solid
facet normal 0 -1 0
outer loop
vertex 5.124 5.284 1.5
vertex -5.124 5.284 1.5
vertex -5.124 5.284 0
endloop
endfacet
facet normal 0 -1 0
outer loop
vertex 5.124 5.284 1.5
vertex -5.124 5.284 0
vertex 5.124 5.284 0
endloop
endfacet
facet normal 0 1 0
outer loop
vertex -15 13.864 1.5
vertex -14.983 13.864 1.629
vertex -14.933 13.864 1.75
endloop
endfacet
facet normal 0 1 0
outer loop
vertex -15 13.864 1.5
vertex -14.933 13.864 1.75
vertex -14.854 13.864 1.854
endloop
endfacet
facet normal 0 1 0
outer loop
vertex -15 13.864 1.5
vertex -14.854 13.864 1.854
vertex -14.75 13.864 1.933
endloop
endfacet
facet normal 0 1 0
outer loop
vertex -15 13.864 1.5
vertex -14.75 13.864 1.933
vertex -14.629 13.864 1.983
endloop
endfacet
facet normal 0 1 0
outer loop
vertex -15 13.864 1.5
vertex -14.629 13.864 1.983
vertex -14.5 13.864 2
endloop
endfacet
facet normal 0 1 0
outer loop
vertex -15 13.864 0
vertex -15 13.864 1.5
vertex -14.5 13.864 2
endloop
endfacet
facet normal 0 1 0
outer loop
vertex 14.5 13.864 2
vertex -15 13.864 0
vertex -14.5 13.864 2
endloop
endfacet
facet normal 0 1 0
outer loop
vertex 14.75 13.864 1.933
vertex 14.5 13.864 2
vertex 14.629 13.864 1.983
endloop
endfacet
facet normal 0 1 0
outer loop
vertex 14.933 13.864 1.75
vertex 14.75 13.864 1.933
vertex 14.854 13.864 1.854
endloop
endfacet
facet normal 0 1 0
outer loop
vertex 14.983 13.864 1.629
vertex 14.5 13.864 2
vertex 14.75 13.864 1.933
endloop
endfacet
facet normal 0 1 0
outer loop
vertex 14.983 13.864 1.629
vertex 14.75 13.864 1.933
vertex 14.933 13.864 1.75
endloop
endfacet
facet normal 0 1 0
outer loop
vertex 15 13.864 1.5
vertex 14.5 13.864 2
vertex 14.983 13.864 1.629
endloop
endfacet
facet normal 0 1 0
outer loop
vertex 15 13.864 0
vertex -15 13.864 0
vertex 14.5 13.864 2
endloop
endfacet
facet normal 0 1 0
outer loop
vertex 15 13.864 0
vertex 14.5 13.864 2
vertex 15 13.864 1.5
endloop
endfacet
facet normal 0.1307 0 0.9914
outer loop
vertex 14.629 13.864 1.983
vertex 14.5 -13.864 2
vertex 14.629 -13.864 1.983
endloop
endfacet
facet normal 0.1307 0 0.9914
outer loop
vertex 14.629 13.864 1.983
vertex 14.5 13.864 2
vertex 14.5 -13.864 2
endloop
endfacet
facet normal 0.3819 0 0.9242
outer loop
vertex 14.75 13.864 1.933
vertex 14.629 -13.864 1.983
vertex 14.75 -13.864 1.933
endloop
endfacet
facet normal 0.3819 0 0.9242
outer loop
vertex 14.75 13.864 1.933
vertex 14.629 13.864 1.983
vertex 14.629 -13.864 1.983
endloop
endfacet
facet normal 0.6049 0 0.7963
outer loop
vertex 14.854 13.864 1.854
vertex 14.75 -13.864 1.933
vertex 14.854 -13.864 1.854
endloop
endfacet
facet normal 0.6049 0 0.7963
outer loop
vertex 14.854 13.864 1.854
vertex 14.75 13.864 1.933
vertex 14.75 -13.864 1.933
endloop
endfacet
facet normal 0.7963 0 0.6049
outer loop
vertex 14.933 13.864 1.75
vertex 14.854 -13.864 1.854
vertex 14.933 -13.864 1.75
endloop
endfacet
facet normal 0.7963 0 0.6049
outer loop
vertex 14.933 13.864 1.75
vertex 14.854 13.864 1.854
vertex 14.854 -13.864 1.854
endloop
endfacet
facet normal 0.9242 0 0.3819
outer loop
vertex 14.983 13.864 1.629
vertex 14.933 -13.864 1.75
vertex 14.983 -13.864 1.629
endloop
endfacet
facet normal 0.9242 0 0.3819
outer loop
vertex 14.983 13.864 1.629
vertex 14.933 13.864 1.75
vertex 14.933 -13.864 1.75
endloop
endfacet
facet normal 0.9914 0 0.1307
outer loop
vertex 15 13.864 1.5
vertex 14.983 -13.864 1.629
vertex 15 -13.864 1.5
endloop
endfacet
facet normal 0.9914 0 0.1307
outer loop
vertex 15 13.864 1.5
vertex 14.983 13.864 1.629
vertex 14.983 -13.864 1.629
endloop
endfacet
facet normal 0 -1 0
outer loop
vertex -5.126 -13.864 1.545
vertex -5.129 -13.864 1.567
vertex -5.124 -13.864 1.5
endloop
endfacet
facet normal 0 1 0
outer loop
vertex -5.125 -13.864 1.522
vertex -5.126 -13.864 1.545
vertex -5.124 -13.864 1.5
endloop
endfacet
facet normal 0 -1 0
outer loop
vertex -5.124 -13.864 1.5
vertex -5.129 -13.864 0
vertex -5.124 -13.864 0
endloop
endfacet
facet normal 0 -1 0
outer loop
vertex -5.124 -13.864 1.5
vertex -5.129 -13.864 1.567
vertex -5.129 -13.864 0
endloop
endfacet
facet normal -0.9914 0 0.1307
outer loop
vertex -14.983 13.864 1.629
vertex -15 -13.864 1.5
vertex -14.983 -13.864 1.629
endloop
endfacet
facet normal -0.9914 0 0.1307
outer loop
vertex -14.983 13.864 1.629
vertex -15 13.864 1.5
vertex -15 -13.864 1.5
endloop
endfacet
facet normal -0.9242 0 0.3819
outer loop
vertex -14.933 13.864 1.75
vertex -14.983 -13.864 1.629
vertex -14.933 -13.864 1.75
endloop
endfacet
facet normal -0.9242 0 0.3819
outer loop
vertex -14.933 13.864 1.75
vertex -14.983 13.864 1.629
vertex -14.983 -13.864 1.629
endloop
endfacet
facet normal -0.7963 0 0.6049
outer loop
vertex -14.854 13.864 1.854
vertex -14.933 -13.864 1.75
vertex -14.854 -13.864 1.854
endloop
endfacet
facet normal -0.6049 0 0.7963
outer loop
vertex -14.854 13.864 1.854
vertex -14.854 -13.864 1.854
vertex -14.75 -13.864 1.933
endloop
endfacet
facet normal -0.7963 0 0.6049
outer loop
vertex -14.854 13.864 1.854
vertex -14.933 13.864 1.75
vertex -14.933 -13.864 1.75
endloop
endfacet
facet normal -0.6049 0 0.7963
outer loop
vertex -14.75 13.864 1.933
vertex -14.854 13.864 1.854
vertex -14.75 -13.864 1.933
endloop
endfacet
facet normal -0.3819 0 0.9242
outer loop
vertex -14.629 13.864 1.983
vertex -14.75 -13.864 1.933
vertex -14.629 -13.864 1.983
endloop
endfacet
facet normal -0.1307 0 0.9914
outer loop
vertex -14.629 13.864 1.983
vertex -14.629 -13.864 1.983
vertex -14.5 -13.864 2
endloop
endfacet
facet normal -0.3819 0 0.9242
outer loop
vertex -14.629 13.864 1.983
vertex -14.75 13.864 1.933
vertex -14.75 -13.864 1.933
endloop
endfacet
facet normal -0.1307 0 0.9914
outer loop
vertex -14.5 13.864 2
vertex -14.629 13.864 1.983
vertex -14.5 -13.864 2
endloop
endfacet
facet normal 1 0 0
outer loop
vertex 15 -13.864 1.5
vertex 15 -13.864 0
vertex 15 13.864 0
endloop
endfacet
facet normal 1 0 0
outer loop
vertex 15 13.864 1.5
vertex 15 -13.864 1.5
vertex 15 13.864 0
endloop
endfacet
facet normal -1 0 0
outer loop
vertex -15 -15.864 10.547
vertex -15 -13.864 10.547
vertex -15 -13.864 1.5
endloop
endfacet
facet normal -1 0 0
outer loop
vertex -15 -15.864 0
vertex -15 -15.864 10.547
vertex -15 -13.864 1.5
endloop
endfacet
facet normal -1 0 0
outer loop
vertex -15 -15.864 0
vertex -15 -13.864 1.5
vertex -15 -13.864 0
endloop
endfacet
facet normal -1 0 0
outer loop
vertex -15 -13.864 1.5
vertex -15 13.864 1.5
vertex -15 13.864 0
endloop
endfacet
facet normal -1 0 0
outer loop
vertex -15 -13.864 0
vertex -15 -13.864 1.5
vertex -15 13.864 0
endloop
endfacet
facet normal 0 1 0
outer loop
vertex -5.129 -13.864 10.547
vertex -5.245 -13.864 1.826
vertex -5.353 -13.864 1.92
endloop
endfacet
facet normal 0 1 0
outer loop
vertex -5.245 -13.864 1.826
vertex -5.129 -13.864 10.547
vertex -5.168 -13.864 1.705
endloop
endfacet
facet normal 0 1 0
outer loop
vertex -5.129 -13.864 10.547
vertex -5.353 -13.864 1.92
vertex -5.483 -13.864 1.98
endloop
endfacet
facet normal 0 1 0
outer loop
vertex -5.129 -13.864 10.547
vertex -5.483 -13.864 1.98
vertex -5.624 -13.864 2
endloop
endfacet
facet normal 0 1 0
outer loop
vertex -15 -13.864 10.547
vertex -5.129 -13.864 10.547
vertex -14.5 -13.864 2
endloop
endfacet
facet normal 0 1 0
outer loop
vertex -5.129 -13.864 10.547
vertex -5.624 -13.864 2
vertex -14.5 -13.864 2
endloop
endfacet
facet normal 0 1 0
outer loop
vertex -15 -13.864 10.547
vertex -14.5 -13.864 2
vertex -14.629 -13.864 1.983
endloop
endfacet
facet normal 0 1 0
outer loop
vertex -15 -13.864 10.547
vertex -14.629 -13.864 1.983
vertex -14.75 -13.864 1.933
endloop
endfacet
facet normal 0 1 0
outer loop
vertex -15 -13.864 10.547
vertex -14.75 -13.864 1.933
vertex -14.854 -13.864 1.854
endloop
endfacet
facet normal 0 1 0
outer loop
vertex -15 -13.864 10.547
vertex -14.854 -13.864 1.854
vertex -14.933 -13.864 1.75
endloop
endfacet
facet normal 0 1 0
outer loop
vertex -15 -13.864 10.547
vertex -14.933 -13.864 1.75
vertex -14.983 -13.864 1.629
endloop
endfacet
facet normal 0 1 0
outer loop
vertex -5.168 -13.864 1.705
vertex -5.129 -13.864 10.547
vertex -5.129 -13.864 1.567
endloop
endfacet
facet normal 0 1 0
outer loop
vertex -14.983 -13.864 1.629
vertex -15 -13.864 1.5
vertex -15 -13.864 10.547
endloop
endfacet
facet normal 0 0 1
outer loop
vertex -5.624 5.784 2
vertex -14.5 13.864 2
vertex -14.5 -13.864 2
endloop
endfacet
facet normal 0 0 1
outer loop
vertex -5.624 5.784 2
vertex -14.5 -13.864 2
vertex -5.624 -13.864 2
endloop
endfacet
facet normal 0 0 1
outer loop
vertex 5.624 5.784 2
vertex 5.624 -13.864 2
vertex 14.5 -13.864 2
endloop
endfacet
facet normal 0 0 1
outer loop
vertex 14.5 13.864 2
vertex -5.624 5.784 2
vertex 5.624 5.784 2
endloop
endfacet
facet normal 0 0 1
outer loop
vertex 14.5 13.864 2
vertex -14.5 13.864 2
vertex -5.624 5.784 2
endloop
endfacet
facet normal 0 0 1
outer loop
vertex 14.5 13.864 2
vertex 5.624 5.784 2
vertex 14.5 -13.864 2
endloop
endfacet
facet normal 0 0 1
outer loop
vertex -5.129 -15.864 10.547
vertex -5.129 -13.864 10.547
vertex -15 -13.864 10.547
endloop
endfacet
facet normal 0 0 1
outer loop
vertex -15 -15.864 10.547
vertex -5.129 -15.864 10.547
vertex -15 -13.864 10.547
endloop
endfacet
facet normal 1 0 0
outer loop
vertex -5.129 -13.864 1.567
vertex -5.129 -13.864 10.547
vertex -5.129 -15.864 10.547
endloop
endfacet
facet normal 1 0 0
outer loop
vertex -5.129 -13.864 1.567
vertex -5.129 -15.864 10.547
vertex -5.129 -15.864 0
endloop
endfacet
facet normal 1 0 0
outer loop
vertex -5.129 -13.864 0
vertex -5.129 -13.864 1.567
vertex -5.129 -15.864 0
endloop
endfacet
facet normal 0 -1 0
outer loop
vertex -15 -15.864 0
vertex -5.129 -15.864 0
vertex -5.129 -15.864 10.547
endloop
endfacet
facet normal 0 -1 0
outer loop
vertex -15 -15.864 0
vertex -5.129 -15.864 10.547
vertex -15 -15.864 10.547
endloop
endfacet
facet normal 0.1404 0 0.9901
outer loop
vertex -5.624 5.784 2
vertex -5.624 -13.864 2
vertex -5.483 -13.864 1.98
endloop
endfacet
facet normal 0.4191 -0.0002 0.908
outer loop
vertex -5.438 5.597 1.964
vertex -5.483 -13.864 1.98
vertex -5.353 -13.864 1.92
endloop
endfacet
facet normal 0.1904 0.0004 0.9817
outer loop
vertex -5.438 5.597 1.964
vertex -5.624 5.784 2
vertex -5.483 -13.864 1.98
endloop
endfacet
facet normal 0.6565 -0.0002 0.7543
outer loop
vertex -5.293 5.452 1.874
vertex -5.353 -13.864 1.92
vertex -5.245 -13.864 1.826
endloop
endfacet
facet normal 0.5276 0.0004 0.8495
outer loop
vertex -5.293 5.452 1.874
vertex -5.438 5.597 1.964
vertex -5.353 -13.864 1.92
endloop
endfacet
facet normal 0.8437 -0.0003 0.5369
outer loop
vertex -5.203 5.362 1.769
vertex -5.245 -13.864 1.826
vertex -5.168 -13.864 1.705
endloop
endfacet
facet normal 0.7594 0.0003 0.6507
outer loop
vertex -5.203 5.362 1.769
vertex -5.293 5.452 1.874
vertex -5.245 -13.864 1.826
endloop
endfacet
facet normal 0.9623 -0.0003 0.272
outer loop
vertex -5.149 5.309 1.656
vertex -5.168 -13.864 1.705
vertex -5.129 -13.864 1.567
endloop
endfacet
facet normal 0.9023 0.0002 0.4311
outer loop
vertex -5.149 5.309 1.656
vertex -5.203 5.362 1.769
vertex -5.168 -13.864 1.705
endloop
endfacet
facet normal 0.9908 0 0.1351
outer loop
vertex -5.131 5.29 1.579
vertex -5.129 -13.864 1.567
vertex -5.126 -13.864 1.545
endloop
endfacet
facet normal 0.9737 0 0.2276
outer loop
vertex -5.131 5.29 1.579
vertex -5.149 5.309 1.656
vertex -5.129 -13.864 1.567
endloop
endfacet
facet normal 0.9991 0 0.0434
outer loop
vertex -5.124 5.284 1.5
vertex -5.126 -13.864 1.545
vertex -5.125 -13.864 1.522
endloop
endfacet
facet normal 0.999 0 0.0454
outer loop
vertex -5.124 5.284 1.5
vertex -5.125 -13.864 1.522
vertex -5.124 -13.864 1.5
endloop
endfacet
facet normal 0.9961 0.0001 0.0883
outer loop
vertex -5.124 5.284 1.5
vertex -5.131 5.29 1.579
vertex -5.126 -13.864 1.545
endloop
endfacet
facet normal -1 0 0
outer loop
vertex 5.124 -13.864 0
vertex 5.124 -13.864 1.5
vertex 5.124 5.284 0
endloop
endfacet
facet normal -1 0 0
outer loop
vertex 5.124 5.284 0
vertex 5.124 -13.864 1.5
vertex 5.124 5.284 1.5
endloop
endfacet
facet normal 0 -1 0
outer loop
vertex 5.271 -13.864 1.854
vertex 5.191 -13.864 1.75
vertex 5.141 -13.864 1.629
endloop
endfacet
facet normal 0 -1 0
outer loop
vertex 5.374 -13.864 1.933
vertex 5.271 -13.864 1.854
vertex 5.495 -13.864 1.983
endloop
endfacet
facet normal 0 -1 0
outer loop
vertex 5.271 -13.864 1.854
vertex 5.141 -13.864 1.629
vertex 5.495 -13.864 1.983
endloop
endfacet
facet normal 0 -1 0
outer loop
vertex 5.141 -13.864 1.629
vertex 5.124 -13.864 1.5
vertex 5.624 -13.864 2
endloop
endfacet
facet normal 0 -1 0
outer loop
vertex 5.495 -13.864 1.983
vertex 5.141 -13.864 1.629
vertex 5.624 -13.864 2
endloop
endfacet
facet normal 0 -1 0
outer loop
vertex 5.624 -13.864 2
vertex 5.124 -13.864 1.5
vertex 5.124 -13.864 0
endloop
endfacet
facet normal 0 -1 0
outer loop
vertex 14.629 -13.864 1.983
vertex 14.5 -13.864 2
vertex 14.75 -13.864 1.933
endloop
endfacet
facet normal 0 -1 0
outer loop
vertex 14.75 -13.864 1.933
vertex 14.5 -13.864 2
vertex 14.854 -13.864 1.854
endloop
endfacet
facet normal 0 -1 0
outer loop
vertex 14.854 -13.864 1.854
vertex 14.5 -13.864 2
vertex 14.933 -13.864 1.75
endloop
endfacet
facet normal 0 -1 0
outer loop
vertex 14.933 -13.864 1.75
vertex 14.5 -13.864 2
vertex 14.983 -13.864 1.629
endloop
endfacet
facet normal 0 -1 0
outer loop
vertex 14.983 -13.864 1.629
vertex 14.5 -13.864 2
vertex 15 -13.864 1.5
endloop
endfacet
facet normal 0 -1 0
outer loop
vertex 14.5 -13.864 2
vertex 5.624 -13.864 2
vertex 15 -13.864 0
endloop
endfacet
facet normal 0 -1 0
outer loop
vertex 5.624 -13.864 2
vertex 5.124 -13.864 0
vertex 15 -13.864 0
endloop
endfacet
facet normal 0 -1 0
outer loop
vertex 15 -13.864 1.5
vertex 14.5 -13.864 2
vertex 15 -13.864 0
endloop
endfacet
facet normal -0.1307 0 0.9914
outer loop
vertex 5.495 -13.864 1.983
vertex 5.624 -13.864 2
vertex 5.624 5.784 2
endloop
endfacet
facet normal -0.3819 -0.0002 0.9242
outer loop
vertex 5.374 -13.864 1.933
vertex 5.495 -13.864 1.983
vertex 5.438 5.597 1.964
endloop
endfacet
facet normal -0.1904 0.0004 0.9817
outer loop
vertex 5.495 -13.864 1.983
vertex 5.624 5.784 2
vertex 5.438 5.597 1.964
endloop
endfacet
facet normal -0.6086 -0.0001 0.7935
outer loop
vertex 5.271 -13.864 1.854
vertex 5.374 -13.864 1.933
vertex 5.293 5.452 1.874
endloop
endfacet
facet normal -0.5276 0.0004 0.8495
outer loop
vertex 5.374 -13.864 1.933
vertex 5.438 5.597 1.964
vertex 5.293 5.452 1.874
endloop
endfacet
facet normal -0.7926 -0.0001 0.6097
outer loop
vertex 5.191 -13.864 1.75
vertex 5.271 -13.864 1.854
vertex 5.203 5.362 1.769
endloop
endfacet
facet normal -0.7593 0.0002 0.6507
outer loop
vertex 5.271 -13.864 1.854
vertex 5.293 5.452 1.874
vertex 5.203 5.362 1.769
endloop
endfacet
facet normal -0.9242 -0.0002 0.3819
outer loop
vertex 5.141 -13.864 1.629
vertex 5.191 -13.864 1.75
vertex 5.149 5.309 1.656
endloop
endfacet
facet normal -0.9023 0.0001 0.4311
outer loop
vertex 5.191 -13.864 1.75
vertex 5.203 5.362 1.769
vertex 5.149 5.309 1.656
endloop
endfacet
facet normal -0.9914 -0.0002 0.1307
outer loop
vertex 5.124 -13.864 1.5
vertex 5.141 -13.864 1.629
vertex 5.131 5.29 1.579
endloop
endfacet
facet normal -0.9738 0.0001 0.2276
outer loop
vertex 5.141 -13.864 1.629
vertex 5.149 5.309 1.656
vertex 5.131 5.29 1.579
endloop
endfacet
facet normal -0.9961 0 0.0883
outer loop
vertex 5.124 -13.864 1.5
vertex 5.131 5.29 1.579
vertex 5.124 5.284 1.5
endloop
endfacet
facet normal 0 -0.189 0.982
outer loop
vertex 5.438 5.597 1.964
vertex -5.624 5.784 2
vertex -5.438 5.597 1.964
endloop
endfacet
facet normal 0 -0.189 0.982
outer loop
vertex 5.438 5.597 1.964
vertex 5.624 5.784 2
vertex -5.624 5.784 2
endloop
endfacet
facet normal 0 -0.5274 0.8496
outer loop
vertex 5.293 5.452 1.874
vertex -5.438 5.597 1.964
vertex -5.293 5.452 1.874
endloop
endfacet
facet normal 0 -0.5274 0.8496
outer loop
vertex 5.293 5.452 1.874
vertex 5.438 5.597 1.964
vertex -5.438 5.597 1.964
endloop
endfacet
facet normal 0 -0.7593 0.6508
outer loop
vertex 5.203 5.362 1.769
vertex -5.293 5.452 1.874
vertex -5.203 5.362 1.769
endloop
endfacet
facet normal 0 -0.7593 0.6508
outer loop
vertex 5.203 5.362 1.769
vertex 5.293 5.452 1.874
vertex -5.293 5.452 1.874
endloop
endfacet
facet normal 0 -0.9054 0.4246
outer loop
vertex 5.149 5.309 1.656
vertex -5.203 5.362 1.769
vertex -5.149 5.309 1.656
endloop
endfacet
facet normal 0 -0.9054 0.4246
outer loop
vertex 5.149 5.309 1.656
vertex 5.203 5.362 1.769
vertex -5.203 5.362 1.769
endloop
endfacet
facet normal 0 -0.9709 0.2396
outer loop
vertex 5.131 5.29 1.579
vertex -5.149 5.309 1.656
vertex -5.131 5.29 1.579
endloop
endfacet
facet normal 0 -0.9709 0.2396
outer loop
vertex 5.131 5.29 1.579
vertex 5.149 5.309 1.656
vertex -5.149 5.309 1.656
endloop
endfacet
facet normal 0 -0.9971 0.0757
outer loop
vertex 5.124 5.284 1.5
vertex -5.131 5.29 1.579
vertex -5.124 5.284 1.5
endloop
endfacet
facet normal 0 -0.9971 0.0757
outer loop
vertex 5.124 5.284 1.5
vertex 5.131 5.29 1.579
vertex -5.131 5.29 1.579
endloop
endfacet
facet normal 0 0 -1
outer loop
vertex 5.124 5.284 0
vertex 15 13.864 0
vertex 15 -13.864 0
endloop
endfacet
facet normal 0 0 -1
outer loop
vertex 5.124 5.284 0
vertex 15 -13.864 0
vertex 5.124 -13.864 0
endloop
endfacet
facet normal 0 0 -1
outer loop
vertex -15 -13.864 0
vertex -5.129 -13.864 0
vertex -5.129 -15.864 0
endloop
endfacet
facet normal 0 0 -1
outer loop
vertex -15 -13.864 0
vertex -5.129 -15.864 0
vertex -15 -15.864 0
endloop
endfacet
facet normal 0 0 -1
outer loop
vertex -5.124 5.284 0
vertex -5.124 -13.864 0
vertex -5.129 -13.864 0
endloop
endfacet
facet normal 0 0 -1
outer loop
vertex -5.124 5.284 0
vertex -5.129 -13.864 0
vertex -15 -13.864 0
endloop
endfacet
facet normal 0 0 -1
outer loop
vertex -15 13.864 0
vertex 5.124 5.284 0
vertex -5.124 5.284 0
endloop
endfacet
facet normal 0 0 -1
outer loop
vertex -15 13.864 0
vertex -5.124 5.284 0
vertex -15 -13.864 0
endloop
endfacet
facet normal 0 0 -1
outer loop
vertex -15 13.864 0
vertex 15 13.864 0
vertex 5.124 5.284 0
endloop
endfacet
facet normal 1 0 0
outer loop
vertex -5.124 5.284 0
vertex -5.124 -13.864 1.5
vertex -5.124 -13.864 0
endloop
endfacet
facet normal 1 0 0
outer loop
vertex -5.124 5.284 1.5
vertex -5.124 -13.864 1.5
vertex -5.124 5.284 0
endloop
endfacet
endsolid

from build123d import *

# Parameters (mm, degrees)
SKETCH1_W           = 30
SKETCH1_H           = 27.727272728
BOSS_EXTRUDE1_DEPTH = 2
SKETCH2_W           = 10.248894408
SKETCH2_H           = 19.156033471
CUT_EXTRUDE1_DEPTH  = 2
FILLET1_R           = 0.5
FILLET2_R           = 0.5
FILLET3_R           = 0.5
FILLET4_R           = 0.5
FILLET5_R           = 0.5
SKETCH3_W           = 9.871005128
SKETCH3_H           = 10.546548519
BOSS_EXTRUDE2_DEPTH = 2


with BuildPart() as part:
    # Sketch1 → Boss-Extrude1 (new body)
    with BuildSketch(Plane.XY):
        Rectangle(SKETCH1_W, SKETCH1_H)
    extrude(amount=BOSS_EXTRUDE1_DEPTH)

    # Sketch2 → Cut-Extrude1 (cut)
    with BuildSketch(Plane.XY.offset(2)):
        with Locations((0, -4.294276099)):
            Rectangle(SKETCH2_W, SKETCH2_H)
    extrude(amount=-CUT_EXTRUDE1_DEPTH, mode=Mode.SUBTRACT)

    # Fillet1
    fillet1_edges = [part.edges().sort_by_distance(p)[0] for p in [
        (-15, 0, 2),
    ]]
    fillet(fillet1_edges, radius=FILLET1_R)

    # Fillet2
    fillet2_edges = [part.edges().sort_by_distance(p)[0] for p in [
        (15, 0, 2),
    ]]
    fillet(fillet2_edges, radius=FILLET2_R)

    # Fillet3
    fillet3_edges = [part.edges().sort_by_distance(p)[0] for p in [
        (-5.124447204, -4.289947863, 2),
    ]]
    fillet(fillet3_edges, radius=FILLET3_R)

    # Fillet4
    fillet4_edges = [part.edges().sort_by_distance(p)[0] for p in [
        (5.124447204, -4.289947863, 2),
    ]]
    fillet(fillet4_edges, radius=FILLET4_R)

    # Fillet5
    fillet5_edges = [part.edges().sort_by_distance(p)[0] for p in [
        (0, 5.283740637, 2),
    ]]
    fillet(fillet5_edges, radius=FILLET5_R)

    # Sketch3 → Boss-Extrude2 (add)
    with BuildSketch(Plane(origin=(0, -13.863636364, 0), x_dir=(-1, 0, 0), z_dir=(0, -1, 0))):
        with Locations((10.064497436, -5.273274259)):
            Rectangle(SKETCH3_W, SKETCH3_H)
    extrude(amount=BOSS_EXTRUDE2_DEPTH)


solid = part.part
